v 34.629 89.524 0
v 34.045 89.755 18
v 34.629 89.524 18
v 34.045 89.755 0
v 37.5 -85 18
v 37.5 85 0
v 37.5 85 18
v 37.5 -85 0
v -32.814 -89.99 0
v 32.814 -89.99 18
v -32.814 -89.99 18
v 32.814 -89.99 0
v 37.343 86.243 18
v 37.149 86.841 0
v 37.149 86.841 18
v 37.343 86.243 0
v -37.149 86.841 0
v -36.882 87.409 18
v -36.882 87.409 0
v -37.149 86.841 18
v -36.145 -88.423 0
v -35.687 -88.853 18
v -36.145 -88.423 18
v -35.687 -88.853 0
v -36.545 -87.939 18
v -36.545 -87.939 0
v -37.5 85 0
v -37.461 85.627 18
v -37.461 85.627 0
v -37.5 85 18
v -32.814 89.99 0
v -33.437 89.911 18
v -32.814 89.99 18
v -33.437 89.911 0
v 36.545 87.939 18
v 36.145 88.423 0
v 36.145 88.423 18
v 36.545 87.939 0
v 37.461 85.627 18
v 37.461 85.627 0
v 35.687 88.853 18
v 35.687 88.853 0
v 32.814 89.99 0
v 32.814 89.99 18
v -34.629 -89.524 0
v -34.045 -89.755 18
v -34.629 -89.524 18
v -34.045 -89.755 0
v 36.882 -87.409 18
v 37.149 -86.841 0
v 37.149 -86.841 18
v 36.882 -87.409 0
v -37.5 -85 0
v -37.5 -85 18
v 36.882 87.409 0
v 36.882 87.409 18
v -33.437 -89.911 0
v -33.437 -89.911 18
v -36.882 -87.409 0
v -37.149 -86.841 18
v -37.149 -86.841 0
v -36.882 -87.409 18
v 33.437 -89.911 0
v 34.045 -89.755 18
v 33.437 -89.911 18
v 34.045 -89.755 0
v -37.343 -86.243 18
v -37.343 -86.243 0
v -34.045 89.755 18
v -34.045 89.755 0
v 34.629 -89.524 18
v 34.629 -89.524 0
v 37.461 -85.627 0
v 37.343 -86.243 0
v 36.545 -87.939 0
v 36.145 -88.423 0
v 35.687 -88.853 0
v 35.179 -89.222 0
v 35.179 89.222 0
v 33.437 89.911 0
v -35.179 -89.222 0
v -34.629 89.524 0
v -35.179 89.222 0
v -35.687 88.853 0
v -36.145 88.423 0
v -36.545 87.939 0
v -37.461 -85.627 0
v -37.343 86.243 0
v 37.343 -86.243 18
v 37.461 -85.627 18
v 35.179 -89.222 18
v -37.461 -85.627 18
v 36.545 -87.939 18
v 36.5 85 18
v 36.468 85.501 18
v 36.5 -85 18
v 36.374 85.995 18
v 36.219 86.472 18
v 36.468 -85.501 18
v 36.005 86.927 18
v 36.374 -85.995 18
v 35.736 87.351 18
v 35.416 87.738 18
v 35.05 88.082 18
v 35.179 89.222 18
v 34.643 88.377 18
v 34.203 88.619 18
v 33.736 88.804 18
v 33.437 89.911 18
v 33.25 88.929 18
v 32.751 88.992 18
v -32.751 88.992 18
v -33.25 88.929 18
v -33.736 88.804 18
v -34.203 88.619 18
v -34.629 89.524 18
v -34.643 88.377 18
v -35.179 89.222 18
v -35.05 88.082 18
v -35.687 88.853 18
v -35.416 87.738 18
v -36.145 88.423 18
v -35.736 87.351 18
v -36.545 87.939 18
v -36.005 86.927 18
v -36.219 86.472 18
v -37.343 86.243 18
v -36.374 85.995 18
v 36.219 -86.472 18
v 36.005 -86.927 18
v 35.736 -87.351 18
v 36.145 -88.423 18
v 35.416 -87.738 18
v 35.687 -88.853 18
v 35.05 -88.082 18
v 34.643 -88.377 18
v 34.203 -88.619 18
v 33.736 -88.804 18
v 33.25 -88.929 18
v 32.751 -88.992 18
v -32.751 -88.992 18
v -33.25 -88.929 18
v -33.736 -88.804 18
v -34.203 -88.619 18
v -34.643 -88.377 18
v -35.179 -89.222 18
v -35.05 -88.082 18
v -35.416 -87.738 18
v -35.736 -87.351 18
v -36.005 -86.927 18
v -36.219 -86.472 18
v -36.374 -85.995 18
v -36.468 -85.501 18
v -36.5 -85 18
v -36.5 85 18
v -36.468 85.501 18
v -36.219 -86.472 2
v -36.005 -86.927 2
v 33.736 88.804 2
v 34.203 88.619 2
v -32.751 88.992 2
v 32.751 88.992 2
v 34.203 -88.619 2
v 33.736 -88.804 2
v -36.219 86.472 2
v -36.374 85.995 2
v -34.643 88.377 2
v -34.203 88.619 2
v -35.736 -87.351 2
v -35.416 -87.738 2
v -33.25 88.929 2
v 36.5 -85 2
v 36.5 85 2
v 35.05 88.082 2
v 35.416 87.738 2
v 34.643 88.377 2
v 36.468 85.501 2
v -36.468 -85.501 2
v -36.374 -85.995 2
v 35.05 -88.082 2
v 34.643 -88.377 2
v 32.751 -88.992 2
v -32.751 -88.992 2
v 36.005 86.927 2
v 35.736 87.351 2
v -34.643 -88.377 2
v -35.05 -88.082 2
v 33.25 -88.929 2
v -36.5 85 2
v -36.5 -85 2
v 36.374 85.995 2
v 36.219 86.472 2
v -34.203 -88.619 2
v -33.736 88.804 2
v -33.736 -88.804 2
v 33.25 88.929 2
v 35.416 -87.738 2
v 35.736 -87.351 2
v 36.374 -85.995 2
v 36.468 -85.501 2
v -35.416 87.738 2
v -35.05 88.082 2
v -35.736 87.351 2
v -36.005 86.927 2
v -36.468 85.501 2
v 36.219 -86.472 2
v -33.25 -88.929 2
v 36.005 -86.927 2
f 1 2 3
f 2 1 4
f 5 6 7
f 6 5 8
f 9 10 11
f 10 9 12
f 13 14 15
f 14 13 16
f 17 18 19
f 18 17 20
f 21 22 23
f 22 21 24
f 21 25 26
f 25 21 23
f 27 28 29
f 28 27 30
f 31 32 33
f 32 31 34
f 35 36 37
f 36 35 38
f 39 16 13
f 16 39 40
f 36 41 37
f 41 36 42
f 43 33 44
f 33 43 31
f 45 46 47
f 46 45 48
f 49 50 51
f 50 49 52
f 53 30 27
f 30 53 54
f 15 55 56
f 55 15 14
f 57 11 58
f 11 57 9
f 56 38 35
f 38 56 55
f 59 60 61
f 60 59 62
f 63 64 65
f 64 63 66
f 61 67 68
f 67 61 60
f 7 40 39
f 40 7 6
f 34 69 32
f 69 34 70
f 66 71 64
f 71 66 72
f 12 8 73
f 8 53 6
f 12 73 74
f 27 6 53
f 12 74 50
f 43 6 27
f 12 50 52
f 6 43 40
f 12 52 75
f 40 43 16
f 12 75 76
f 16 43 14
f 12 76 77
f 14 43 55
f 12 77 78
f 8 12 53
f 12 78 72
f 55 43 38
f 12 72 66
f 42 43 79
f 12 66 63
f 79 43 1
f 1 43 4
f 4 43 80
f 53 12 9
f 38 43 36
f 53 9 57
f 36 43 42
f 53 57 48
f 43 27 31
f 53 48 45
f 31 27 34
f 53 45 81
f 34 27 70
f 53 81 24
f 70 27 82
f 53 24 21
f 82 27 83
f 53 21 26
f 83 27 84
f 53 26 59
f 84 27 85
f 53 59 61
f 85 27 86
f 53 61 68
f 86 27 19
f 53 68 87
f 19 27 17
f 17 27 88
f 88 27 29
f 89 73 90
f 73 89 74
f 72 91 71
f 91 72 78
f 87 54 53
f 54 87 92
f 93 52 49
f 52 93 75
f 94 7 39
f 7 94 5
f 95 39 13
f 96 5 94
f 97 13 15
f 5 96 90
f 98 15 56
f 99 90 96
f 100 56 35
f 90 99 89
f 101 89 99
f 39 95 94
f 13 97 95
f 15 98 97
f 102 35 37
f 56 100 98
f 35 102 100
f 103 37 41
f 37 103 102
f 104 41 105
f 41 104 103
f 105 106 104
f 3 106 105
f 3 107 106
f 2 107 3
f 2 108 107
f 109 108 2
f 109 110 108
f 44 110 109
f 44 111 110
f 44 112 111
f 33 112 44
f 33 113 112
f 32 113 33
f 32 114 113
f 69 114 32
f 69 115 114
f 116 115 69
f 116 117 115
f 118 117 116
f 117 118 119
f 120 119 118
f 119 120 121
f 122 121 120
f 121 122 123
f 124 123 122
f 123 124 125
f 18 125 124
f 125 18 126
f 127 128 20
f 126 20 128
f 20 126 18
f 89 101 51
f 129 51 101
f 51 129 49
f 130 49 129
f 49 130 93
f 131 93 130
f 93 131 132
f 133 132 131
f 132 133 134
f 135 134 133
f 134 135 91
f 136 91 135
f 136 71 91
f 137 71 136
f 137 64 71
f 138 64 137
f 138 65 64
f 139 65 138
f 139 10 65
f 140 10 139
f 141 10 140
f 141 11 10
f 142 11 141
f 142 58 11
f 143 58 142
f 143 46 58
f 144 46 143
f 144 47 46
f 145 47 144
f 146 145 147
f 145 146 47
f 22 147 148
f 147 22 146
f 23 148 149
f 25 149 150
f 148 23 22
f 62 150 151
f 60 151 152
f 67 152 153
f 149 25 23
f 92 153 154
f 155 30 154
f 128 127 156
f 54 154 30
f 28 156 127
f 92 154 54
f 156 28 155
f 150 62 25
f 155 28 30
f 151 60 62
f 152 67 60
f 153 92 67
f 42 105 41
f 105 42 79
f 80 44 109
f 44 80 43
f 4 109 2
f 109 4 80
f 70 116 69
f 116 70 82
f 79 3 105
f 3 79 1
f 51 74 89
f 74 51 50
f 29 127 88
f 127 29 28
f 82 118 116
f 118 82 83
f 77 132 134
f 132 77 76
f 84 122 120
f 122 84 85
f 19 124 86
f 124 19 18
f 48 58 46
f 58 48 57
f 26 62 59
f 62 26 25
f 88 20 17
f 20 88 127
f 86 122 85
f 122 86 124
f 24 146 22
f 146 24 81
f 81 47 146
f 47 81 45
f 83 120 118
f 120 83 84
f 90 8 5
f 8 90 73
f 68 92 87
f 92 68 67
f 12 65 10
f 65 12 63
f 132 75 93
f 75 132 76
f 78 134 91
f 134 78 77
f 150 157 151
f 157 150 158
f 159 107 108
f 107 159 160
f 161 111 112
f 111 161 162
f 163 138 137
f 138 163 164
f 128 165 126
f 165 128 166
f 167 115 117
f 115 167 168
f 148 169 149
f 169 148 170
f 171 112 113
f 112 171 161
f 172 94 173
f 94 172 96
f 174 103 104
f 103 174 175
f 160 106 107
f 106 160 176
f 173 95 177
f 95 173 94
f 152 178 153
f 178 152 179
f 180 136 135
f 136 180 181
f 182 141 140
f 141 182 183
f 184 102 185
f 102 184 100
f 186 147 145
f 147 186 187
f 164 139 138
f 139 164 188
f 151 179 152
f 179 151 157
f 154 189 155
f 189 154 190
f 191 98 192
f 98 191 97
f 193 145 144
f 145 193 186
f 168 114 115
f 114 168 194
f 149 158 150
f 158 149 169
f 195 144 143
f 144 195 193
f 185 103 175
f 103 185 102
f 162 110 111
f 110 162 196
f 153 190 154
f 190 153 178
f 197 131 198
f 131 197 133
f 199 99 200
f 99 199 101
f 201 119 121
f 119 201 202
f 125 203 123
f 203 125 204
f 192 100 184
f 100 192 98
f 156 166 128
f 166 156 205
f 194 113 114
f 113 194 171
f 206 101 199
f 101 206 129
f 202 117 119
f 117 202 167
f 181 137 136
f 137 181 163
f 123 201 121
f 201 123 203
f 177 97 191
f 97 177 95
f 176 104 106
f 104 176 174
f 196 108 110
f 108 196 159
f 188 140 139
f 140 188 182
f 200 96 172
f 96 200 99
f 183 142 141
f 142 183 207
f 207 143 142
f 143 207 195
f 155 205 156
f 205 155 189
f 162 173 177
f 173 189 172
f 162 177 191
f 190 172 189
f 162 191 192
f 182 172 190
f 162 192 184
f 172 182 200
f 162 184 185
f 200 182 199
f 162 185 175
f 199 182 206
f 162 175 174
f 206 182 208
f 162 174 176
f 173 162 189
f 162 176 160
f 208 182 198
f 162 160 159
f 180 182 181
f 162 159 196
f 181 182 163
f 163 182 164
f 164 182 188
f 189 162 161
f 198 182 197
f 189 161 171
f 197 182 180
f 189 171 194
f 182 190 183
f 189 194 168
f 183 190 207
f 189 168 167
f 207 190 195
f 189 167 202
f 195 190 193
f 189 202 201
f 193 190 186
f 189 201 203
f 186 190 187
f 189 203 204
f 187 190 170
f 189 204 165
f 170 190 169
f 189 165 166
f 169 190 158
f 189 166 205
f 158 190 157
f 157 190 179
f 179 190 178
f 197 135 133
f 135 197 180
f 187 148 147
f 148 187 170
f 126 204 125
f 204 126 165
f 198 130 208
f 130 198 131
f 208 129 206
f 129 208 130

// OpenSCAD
$fn = 50;


difference() {
	union() {
		hull() {
			translate(v = [-32.5000000000, 85.0000000000, 0]) {
				cylinder(h = 18, r = 5);
			}
			translate(v = [32.5000000000, 85.0000000000, 0]) {
				cylinder(h = 18, r = 5);
			}
			translate(v = [-32.5000000000, -85.0000000000, 0]) {
				cylinder(h = 18, r = 5);
			}
			translate(v = [32.5000000000, -85.0000000000, 0]) {
				cylinder(h = 18, r = 5);
			}
		}
	}
	union() {
		translate(v = [0, 0, 2]) {
			hull() {
				translate(v = [-32.5000000000, 85.0000000000, 0]) {
					cylinder(h = 16, r = 4);
				}
				translate(v = [32.5000000000, 85.0000000000, 0]) {
					cylinder(h = 16, r = 4);
				}
				translate(v = [-32.5000000000, -85.0000000000, 0]) {
					cylinder(h = 16, r = 4);
				}
				translate(v = [32.5000000000, -85.0000000000, 0]) {
					cylinder(h = 16, r = 4);
				}
			}
		}
	}
}
